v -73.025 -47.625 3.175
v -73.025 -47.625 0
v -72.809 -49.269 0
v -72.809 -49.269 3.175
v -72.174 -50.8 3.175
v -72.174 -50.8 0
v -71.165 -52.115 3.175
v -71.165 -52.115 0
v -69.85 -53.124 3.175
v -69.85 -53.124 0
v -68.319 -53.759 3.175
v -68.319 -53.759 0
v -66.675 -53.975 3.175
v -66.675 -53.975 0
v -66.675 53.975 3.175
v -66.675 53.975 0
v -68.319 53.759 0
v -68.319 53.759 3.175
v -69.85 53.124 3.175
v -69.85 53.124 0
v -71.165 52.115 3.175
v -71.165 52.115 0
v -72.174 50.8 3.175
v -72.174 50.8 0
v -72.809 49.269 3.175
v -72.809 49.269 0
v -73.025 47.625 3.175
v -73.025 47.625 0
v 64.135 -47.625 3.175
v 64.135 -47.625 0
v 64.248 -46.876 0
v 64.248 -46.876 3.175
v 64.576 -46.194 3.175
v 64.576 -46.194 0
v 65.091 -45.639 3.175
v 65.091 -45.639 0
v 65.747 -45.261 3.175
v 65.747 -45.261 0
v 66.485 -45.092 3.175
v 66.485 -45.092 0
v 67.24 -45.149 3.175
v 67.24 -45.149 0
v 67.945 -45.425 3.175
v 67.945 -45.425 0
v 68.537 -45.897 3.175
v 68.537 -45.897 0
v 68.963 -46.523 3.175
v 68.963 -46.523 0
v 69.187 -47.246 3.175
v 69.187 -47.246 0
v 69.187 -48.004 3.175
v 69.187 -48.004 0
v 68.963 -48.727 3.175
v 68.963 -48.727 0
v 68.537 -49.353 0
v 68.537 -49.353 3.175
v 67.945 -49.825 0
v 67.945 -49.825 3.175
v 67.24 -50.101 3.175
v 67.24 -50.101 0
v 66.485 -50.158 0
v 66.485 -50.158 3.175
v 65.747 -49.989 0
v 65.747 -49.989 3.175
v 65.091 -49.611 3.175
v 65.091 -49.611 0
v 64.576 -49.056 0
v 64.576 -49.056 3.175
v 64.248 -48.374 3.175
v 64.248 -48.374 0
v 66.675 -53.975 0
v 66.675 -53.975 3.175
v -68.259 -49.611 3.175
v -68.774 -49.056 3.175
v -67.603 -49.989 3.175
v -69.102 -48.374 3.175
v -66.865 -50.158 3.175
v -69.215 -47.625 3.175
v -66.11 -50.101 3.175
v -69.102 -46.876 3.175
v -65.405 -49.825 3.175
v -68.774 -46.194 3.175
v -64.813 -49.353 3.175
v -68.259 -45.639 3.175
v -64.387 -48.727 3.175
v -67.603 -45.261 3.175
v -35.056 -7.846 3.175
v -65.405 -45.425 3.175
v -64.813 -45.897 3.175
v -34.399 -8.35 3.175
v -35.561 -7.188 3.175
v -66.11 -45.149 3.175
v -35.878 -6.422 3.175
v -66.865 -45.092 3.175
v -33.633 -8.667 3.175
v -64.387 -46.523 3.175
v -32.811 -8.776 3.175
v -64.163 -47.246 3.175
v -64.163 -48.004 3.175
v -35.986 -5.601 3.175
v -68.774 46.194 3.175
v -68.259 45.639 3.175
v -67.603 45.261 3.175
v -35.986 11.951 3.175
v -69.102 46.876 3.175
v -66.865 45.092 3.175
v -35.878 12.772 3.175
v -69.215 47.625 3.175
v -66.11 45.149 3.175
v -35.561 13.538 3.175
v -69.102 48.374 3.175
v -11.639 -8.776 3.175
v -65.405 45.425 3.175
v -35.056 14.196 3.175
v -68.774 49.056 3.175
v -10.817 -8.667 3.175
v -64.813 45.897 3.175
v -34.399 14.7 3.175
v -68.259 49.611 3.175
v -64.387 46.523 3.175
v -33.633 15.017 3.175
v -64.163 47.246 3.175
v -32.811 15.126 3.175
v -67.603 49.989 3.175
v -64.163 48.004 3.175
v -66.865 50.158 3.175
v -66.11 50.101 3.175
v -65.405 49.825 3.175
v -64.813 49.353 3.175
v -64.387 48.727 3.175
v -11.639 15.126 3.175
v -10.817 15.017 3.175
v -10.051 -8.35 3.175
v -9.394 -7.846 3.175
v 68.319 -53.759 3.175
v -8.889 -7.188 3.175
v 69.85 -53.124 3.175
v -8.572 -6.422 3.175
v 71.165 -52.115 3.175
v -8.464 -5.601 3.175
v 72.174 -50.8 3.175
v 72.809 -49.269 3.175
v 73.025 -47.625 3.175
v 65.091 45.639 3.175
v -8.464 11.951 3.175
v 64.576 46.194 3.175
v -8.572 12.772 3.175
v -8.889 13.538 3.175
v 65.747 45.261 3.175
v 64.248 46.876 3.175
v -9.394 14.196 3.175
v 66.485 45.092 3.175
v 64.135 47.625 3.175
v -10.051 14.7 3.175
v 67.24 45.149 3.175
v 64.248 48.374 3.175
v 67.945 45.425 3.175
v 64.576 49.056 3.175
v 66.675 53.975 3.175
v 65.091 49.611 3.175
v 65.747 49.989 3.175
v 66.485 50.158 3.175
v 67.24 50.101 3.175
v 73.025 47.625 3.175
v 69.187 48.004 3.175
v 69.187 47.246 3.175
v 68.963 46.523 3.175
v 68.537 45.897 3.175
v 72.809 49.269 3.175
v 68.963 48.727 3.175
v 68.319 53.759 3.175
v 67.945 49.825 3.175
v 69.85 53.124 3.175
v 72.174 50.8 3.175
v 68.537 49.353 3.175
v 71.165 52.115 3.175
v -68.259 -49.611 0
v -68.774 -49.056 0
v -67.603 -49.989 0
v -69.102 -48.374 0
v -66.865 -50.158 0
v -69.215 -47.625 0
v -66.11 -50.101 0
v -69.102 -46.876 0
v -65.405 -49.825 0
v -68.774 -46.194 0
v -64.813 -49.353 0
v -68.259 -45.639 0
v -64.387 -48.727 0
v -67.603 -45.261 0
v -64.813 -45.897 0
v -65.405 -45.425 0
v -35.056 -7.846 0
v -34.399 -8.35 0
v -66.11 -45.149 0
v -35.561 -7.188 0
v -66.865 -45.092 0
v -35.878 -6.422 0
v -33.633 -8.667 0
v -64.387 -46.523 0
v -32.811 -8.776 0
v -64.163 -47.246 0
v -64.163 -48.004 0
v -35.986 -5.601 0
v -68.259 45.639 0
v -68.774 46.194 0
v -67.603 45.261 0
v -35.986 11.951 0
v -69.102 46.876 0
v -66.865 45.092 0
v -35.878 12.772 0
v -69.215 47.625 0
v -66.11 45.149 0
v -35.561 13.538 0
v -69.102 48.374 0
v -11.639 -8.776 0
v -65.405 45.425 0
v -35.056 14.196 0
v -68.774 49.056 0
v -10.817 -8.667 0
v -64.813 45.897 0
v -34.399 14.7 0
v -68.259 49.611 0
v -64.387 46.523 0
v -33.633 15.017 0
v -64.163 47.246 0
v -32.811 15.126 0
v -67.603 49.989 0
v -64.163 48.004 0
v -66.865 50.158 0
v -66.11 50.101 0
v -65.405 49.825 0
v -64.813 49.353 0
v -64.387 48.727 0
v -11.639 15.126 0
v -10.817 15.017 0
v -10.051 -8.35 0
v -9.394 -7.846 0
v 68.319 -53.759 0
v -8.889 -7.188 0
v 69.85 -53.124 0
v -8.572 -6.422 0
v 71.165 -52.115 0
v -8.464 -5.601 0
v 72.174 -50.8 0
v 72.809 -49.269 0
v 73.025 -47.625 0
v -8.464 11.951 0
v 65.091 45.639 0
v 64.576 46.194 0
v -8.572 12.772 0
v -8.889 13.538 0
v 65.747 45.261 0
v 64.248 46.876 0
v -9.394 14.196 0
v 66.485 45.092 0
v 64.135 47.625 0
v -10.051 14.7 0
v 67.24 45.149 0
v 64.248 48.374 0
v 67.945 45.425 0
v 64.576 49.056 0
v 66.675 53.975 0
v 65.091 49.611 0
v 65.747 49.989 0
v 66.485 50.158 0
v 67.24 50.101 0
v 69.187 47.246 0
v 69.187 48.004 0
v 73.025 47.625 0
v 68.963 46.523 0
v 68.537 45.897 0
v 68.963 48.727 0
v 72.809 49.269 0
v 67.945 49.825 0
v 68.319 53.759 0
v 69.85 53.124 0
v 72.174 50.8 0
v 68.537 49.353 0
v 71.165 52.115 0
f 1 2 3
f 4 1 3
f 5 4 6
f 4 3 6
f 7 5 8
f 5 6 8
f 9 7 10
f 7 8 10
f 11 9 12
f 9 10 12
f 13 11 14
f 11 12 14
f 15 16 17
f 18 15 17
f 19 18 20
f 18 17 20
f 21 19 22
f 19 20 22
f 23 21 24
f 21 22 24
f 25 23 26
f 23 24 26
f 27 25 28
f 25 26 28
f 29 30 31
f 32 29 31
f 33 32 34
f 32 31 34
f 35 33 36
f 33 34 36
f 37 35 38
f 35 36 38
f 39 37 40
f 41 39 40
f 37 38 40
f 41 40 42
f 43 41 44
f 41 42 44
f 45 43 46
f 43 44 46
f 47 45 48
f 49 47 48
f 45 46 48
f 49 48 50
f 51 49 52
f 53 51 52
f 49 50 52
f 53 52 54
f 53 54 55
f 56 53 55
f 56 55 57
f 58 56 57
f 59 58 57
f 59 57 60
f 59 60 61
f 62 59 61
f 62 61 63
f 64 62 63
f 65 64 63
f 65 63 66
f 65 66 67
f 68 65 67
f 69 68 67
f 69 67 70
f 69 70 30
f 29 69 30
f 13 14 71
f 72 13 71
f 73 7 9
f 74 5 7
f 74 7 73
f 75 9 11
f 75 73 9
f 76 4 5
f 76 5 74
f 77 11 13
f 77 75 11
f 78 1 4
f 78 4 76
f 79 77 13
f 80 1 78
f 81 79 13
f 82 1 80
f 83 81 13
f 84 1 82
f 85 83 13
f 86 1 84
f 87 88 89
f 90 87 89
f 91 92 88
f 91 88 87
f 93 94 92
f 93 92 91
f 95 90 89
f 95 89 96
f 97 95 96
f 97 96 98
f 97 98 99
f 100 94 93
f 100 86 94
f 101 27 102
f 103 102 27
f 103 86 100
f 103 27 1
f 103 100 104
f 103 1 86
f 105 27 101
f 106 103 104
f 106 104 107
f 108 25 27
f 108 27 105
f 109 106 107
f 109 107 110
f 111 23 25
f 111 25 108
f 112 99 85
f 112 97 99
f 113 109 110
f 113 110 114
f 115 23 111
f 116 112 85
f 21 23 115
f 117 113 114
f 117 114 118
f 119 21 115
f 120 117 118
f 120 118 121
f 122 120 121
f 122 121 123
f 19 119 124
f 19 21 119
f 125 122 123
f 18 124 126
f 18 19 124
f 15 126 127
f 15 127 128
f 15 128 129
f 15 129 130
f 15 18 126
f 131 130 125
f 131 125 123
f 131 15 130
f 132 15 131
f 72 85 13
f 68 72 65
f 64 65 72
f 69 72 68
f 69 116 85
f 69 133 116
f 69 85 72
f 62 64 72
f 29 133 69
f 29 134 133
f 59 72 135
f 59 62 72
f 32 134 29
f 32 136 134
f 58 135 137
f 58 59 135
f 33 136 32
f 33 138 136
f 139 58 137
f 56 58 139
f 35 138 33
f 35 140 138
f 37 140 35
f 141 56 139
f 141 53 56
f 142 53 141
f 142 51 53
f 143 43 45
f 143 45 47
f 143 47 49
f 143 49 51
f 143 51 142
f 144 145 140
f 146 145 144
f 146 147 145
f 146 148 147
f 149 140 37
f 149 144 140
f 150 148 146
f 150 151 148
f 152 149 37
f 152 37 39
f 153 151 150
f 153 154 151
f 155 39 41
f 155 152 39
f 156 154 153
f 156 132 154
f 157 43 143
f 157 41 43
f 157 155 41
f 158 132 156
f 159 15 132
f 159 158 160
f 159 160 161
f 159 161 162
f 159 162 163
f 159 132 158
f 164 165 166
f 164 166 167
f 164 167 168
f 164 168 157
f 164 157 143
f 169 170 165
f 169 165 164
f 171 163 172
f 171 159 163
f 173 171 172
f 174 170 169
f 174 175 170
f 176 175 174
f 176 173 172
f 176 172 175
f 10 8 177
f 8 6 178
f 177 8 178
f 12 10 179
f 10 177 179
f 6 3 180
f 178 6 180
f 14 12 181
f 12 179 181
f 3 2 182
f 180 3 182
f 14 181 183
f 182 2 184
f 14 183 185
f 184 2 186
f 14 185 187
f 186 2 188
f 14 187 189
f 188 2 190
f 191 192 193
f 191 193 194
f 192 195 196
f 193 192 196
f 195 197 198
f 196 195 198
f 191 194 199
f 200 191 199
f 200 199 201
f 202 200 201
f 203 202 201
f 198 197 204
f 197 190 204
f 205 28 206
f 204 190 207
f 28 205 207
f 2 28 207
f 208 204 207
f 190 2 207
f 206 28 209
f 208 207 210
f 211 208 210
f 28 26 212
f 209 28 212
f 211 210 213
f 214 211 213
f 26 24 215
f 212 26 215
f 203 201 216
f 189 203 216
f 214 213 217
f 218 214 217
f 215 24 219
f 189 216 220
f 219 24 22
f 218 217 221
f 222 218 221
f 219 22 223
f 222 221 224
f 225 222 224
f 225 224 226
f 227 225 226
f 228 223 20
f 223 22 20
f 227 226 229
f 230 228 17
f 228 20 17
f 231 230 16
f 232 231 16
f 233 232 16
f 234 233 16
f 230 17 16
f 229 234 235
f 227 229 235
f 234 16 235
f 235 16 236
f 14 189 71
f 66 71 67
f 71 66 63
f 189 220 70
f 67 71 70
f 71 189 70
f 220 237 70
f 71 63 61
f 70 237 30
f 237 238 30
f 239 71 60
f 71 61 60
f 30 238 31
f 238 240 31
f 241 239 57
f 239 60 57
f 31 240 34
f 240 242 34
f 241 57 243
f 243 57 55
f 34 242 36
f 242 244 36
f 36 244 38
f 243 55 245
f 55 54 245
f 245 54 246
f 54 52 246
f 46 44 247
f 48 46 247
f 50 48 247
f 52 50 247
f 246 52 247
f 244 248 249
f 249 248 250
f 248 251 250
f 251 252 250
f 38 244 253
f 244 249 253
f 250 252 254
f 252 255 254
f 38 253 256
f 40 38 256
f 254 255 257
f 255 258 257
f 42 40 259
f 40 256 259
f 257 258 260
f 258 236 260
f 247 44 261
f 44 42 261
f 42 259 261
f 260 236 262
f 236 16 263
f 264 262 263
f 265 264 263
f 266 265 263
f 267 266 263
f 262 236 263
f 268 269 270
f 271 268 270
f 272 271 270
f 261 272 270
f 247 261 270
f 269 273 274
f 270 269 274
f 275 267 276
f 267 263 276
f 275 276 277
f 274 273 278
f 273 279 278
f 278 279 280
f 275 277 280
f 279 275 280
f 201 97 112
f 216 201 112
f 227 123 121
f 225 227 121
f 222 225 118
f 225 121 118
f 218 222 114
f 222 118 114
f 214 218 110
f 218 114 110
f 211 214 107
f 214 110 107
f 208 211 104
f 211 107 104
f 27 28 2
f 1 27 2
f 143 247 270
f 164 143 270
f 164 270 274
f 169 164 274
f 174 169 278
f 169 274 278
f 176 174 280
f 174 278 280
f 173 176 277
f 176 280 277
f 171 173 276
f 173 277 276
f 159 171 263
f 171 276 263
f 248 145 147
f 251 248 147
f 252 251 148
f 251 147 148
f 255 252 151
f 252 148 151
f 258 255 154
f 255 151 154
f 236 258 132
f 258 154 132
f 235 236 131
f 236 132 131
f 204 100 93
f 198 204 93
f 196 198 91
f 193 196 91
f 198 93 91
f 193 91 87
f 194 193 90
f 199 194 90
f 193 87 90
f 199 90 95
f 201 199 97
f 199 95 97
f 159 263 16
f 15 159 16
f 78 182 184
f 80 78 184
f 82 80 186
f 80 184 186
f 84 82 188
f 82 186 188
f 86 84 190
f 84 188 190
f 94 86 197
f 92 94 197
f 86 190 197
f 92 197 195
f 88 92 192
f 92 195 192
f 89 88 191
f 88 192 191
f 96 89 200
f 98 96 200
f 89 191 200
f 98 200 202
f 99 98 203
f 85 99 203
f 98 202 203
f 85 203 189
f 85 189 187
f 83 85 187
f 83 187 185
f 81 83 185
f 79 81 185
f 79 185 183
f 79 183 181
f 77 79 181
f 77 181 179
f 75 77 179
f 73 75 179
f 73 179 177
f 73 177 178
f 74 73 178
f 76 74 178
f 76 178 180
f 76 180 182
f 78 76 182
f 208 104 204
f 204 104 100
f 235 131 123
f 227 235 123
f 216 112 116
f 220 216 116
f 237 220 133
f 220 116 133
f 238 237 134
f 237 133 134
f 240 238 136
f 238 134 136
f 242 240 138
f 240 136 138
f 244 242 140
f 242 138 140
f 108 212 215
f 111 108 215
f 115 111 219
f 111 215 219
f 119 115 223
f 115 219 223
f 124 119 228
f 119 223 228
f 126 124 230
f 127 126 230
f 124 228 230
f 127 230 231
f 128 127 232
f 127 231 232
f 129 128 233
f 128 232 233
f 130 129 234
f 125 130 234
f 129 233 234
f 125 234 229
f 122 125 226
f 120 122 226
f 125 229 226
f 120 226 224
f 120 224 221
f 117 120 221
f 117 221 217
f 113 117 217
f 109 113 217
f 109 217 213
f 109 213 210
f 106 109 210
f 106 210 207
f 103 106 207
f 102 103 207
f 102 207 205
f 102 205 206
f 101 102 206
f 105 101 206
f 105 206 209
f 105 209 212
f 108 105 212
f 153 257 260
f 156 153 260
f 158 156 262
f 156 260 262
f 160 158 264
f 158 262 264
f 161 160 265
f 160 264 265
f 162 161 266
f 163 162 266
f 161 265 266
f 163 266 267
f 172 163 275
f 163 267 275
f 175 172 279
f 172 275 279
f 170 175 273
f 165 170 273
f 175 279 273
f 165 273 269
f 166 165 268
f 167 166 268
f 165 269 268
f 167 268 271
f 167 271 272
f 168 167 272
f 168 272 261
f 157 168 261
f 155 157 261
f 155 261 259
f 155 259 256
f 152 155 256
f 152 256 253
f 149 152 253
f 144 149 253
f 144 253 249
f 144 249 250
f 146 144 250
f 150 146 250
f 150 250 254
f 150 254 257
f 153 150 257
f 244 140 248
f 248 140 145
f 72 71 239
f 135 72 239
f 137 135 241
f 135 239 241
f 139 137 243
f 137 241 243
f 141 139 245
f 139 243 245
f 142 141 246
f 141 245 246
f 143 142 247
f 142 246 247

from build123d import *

# Parameters (mm, degrees)
F1_DEPTH = 3.175
F3_D     = 5.08
F5_DEPTH = 3.176


with BuildPart() as f1:
    # F0 (on Top) → F1 (new body)
    with BuildSketch(Plane.XY):
        with BuildLine():
            ThreePointArc((73.025, 47.625), (71.165128, 52.115128), (66.675, 53.975))
            Line((66.675, 53.975), (-66.675, 53.975))
            ThreePointArc((-66.675, 53.975), (-71.165128, 52.115128), (-73.025, 47.625))
            Line((-73.025, 47.625), (-73.025, -47.625))
            ThreePointArc((-73.025, -47.625), (-71.165128, -52.115128), (-66.675, -53.975))
            Line((-66.675, -53.975), (66.675, -53.975))
            ThreePointArc((66.675, -53.975), (71.165128, -52.115128), (73.025, -47.625))
            Line((73.025, -47.625), (73.025, 47.625))
        make_face()
    extrude(amount=F1_DEPTH)

    # F3 (through all)
    with Locations(Plane.XY.offset(3.175)):
        with Locations((-66.675, 47.625), (66.675, 47.625), (66.675, -47.625), (-66.675, -47.625)):
            Hole(F3_D / 2)

    # F4 (on face) → F5 (cut, through all)
    with BuildSketch(Plane.XY.offset(3.175)):
        with BuildLine():
            Line((-32.811304, -8.775606), (-11.638696, -8.775606))
            ThreePointArc((-11.638696, -8.775606), (-9.393632, -7.845671), (-8.463696, -5.600606))
            Line((-8.463696, -5.600606), (-8.463696, 11.950606))
            ThreePointArc((-8.463696, 11.950606), (-9.393632, 14.195671), (-11.638696, 15.125606))
            Line((-11.638696, 15.125606), (-32.811304, 15.125606))
            ThreePointArc((-32.811304, 15.125606), (-35.056368, 14.195671), (-35.986304, 11.950606))
            Line((-35.986304, 11.950606), (-35.986304, -5.600606))
            ThreePointArc((-35.986304, -5.600606), (-35.056368, -7.845671), (-32.811304, -8.775606))
        make_face()
    extrude(amount=-F5_DEPTH, mode=Mode.SUBTRACT)


solid = f1.part
